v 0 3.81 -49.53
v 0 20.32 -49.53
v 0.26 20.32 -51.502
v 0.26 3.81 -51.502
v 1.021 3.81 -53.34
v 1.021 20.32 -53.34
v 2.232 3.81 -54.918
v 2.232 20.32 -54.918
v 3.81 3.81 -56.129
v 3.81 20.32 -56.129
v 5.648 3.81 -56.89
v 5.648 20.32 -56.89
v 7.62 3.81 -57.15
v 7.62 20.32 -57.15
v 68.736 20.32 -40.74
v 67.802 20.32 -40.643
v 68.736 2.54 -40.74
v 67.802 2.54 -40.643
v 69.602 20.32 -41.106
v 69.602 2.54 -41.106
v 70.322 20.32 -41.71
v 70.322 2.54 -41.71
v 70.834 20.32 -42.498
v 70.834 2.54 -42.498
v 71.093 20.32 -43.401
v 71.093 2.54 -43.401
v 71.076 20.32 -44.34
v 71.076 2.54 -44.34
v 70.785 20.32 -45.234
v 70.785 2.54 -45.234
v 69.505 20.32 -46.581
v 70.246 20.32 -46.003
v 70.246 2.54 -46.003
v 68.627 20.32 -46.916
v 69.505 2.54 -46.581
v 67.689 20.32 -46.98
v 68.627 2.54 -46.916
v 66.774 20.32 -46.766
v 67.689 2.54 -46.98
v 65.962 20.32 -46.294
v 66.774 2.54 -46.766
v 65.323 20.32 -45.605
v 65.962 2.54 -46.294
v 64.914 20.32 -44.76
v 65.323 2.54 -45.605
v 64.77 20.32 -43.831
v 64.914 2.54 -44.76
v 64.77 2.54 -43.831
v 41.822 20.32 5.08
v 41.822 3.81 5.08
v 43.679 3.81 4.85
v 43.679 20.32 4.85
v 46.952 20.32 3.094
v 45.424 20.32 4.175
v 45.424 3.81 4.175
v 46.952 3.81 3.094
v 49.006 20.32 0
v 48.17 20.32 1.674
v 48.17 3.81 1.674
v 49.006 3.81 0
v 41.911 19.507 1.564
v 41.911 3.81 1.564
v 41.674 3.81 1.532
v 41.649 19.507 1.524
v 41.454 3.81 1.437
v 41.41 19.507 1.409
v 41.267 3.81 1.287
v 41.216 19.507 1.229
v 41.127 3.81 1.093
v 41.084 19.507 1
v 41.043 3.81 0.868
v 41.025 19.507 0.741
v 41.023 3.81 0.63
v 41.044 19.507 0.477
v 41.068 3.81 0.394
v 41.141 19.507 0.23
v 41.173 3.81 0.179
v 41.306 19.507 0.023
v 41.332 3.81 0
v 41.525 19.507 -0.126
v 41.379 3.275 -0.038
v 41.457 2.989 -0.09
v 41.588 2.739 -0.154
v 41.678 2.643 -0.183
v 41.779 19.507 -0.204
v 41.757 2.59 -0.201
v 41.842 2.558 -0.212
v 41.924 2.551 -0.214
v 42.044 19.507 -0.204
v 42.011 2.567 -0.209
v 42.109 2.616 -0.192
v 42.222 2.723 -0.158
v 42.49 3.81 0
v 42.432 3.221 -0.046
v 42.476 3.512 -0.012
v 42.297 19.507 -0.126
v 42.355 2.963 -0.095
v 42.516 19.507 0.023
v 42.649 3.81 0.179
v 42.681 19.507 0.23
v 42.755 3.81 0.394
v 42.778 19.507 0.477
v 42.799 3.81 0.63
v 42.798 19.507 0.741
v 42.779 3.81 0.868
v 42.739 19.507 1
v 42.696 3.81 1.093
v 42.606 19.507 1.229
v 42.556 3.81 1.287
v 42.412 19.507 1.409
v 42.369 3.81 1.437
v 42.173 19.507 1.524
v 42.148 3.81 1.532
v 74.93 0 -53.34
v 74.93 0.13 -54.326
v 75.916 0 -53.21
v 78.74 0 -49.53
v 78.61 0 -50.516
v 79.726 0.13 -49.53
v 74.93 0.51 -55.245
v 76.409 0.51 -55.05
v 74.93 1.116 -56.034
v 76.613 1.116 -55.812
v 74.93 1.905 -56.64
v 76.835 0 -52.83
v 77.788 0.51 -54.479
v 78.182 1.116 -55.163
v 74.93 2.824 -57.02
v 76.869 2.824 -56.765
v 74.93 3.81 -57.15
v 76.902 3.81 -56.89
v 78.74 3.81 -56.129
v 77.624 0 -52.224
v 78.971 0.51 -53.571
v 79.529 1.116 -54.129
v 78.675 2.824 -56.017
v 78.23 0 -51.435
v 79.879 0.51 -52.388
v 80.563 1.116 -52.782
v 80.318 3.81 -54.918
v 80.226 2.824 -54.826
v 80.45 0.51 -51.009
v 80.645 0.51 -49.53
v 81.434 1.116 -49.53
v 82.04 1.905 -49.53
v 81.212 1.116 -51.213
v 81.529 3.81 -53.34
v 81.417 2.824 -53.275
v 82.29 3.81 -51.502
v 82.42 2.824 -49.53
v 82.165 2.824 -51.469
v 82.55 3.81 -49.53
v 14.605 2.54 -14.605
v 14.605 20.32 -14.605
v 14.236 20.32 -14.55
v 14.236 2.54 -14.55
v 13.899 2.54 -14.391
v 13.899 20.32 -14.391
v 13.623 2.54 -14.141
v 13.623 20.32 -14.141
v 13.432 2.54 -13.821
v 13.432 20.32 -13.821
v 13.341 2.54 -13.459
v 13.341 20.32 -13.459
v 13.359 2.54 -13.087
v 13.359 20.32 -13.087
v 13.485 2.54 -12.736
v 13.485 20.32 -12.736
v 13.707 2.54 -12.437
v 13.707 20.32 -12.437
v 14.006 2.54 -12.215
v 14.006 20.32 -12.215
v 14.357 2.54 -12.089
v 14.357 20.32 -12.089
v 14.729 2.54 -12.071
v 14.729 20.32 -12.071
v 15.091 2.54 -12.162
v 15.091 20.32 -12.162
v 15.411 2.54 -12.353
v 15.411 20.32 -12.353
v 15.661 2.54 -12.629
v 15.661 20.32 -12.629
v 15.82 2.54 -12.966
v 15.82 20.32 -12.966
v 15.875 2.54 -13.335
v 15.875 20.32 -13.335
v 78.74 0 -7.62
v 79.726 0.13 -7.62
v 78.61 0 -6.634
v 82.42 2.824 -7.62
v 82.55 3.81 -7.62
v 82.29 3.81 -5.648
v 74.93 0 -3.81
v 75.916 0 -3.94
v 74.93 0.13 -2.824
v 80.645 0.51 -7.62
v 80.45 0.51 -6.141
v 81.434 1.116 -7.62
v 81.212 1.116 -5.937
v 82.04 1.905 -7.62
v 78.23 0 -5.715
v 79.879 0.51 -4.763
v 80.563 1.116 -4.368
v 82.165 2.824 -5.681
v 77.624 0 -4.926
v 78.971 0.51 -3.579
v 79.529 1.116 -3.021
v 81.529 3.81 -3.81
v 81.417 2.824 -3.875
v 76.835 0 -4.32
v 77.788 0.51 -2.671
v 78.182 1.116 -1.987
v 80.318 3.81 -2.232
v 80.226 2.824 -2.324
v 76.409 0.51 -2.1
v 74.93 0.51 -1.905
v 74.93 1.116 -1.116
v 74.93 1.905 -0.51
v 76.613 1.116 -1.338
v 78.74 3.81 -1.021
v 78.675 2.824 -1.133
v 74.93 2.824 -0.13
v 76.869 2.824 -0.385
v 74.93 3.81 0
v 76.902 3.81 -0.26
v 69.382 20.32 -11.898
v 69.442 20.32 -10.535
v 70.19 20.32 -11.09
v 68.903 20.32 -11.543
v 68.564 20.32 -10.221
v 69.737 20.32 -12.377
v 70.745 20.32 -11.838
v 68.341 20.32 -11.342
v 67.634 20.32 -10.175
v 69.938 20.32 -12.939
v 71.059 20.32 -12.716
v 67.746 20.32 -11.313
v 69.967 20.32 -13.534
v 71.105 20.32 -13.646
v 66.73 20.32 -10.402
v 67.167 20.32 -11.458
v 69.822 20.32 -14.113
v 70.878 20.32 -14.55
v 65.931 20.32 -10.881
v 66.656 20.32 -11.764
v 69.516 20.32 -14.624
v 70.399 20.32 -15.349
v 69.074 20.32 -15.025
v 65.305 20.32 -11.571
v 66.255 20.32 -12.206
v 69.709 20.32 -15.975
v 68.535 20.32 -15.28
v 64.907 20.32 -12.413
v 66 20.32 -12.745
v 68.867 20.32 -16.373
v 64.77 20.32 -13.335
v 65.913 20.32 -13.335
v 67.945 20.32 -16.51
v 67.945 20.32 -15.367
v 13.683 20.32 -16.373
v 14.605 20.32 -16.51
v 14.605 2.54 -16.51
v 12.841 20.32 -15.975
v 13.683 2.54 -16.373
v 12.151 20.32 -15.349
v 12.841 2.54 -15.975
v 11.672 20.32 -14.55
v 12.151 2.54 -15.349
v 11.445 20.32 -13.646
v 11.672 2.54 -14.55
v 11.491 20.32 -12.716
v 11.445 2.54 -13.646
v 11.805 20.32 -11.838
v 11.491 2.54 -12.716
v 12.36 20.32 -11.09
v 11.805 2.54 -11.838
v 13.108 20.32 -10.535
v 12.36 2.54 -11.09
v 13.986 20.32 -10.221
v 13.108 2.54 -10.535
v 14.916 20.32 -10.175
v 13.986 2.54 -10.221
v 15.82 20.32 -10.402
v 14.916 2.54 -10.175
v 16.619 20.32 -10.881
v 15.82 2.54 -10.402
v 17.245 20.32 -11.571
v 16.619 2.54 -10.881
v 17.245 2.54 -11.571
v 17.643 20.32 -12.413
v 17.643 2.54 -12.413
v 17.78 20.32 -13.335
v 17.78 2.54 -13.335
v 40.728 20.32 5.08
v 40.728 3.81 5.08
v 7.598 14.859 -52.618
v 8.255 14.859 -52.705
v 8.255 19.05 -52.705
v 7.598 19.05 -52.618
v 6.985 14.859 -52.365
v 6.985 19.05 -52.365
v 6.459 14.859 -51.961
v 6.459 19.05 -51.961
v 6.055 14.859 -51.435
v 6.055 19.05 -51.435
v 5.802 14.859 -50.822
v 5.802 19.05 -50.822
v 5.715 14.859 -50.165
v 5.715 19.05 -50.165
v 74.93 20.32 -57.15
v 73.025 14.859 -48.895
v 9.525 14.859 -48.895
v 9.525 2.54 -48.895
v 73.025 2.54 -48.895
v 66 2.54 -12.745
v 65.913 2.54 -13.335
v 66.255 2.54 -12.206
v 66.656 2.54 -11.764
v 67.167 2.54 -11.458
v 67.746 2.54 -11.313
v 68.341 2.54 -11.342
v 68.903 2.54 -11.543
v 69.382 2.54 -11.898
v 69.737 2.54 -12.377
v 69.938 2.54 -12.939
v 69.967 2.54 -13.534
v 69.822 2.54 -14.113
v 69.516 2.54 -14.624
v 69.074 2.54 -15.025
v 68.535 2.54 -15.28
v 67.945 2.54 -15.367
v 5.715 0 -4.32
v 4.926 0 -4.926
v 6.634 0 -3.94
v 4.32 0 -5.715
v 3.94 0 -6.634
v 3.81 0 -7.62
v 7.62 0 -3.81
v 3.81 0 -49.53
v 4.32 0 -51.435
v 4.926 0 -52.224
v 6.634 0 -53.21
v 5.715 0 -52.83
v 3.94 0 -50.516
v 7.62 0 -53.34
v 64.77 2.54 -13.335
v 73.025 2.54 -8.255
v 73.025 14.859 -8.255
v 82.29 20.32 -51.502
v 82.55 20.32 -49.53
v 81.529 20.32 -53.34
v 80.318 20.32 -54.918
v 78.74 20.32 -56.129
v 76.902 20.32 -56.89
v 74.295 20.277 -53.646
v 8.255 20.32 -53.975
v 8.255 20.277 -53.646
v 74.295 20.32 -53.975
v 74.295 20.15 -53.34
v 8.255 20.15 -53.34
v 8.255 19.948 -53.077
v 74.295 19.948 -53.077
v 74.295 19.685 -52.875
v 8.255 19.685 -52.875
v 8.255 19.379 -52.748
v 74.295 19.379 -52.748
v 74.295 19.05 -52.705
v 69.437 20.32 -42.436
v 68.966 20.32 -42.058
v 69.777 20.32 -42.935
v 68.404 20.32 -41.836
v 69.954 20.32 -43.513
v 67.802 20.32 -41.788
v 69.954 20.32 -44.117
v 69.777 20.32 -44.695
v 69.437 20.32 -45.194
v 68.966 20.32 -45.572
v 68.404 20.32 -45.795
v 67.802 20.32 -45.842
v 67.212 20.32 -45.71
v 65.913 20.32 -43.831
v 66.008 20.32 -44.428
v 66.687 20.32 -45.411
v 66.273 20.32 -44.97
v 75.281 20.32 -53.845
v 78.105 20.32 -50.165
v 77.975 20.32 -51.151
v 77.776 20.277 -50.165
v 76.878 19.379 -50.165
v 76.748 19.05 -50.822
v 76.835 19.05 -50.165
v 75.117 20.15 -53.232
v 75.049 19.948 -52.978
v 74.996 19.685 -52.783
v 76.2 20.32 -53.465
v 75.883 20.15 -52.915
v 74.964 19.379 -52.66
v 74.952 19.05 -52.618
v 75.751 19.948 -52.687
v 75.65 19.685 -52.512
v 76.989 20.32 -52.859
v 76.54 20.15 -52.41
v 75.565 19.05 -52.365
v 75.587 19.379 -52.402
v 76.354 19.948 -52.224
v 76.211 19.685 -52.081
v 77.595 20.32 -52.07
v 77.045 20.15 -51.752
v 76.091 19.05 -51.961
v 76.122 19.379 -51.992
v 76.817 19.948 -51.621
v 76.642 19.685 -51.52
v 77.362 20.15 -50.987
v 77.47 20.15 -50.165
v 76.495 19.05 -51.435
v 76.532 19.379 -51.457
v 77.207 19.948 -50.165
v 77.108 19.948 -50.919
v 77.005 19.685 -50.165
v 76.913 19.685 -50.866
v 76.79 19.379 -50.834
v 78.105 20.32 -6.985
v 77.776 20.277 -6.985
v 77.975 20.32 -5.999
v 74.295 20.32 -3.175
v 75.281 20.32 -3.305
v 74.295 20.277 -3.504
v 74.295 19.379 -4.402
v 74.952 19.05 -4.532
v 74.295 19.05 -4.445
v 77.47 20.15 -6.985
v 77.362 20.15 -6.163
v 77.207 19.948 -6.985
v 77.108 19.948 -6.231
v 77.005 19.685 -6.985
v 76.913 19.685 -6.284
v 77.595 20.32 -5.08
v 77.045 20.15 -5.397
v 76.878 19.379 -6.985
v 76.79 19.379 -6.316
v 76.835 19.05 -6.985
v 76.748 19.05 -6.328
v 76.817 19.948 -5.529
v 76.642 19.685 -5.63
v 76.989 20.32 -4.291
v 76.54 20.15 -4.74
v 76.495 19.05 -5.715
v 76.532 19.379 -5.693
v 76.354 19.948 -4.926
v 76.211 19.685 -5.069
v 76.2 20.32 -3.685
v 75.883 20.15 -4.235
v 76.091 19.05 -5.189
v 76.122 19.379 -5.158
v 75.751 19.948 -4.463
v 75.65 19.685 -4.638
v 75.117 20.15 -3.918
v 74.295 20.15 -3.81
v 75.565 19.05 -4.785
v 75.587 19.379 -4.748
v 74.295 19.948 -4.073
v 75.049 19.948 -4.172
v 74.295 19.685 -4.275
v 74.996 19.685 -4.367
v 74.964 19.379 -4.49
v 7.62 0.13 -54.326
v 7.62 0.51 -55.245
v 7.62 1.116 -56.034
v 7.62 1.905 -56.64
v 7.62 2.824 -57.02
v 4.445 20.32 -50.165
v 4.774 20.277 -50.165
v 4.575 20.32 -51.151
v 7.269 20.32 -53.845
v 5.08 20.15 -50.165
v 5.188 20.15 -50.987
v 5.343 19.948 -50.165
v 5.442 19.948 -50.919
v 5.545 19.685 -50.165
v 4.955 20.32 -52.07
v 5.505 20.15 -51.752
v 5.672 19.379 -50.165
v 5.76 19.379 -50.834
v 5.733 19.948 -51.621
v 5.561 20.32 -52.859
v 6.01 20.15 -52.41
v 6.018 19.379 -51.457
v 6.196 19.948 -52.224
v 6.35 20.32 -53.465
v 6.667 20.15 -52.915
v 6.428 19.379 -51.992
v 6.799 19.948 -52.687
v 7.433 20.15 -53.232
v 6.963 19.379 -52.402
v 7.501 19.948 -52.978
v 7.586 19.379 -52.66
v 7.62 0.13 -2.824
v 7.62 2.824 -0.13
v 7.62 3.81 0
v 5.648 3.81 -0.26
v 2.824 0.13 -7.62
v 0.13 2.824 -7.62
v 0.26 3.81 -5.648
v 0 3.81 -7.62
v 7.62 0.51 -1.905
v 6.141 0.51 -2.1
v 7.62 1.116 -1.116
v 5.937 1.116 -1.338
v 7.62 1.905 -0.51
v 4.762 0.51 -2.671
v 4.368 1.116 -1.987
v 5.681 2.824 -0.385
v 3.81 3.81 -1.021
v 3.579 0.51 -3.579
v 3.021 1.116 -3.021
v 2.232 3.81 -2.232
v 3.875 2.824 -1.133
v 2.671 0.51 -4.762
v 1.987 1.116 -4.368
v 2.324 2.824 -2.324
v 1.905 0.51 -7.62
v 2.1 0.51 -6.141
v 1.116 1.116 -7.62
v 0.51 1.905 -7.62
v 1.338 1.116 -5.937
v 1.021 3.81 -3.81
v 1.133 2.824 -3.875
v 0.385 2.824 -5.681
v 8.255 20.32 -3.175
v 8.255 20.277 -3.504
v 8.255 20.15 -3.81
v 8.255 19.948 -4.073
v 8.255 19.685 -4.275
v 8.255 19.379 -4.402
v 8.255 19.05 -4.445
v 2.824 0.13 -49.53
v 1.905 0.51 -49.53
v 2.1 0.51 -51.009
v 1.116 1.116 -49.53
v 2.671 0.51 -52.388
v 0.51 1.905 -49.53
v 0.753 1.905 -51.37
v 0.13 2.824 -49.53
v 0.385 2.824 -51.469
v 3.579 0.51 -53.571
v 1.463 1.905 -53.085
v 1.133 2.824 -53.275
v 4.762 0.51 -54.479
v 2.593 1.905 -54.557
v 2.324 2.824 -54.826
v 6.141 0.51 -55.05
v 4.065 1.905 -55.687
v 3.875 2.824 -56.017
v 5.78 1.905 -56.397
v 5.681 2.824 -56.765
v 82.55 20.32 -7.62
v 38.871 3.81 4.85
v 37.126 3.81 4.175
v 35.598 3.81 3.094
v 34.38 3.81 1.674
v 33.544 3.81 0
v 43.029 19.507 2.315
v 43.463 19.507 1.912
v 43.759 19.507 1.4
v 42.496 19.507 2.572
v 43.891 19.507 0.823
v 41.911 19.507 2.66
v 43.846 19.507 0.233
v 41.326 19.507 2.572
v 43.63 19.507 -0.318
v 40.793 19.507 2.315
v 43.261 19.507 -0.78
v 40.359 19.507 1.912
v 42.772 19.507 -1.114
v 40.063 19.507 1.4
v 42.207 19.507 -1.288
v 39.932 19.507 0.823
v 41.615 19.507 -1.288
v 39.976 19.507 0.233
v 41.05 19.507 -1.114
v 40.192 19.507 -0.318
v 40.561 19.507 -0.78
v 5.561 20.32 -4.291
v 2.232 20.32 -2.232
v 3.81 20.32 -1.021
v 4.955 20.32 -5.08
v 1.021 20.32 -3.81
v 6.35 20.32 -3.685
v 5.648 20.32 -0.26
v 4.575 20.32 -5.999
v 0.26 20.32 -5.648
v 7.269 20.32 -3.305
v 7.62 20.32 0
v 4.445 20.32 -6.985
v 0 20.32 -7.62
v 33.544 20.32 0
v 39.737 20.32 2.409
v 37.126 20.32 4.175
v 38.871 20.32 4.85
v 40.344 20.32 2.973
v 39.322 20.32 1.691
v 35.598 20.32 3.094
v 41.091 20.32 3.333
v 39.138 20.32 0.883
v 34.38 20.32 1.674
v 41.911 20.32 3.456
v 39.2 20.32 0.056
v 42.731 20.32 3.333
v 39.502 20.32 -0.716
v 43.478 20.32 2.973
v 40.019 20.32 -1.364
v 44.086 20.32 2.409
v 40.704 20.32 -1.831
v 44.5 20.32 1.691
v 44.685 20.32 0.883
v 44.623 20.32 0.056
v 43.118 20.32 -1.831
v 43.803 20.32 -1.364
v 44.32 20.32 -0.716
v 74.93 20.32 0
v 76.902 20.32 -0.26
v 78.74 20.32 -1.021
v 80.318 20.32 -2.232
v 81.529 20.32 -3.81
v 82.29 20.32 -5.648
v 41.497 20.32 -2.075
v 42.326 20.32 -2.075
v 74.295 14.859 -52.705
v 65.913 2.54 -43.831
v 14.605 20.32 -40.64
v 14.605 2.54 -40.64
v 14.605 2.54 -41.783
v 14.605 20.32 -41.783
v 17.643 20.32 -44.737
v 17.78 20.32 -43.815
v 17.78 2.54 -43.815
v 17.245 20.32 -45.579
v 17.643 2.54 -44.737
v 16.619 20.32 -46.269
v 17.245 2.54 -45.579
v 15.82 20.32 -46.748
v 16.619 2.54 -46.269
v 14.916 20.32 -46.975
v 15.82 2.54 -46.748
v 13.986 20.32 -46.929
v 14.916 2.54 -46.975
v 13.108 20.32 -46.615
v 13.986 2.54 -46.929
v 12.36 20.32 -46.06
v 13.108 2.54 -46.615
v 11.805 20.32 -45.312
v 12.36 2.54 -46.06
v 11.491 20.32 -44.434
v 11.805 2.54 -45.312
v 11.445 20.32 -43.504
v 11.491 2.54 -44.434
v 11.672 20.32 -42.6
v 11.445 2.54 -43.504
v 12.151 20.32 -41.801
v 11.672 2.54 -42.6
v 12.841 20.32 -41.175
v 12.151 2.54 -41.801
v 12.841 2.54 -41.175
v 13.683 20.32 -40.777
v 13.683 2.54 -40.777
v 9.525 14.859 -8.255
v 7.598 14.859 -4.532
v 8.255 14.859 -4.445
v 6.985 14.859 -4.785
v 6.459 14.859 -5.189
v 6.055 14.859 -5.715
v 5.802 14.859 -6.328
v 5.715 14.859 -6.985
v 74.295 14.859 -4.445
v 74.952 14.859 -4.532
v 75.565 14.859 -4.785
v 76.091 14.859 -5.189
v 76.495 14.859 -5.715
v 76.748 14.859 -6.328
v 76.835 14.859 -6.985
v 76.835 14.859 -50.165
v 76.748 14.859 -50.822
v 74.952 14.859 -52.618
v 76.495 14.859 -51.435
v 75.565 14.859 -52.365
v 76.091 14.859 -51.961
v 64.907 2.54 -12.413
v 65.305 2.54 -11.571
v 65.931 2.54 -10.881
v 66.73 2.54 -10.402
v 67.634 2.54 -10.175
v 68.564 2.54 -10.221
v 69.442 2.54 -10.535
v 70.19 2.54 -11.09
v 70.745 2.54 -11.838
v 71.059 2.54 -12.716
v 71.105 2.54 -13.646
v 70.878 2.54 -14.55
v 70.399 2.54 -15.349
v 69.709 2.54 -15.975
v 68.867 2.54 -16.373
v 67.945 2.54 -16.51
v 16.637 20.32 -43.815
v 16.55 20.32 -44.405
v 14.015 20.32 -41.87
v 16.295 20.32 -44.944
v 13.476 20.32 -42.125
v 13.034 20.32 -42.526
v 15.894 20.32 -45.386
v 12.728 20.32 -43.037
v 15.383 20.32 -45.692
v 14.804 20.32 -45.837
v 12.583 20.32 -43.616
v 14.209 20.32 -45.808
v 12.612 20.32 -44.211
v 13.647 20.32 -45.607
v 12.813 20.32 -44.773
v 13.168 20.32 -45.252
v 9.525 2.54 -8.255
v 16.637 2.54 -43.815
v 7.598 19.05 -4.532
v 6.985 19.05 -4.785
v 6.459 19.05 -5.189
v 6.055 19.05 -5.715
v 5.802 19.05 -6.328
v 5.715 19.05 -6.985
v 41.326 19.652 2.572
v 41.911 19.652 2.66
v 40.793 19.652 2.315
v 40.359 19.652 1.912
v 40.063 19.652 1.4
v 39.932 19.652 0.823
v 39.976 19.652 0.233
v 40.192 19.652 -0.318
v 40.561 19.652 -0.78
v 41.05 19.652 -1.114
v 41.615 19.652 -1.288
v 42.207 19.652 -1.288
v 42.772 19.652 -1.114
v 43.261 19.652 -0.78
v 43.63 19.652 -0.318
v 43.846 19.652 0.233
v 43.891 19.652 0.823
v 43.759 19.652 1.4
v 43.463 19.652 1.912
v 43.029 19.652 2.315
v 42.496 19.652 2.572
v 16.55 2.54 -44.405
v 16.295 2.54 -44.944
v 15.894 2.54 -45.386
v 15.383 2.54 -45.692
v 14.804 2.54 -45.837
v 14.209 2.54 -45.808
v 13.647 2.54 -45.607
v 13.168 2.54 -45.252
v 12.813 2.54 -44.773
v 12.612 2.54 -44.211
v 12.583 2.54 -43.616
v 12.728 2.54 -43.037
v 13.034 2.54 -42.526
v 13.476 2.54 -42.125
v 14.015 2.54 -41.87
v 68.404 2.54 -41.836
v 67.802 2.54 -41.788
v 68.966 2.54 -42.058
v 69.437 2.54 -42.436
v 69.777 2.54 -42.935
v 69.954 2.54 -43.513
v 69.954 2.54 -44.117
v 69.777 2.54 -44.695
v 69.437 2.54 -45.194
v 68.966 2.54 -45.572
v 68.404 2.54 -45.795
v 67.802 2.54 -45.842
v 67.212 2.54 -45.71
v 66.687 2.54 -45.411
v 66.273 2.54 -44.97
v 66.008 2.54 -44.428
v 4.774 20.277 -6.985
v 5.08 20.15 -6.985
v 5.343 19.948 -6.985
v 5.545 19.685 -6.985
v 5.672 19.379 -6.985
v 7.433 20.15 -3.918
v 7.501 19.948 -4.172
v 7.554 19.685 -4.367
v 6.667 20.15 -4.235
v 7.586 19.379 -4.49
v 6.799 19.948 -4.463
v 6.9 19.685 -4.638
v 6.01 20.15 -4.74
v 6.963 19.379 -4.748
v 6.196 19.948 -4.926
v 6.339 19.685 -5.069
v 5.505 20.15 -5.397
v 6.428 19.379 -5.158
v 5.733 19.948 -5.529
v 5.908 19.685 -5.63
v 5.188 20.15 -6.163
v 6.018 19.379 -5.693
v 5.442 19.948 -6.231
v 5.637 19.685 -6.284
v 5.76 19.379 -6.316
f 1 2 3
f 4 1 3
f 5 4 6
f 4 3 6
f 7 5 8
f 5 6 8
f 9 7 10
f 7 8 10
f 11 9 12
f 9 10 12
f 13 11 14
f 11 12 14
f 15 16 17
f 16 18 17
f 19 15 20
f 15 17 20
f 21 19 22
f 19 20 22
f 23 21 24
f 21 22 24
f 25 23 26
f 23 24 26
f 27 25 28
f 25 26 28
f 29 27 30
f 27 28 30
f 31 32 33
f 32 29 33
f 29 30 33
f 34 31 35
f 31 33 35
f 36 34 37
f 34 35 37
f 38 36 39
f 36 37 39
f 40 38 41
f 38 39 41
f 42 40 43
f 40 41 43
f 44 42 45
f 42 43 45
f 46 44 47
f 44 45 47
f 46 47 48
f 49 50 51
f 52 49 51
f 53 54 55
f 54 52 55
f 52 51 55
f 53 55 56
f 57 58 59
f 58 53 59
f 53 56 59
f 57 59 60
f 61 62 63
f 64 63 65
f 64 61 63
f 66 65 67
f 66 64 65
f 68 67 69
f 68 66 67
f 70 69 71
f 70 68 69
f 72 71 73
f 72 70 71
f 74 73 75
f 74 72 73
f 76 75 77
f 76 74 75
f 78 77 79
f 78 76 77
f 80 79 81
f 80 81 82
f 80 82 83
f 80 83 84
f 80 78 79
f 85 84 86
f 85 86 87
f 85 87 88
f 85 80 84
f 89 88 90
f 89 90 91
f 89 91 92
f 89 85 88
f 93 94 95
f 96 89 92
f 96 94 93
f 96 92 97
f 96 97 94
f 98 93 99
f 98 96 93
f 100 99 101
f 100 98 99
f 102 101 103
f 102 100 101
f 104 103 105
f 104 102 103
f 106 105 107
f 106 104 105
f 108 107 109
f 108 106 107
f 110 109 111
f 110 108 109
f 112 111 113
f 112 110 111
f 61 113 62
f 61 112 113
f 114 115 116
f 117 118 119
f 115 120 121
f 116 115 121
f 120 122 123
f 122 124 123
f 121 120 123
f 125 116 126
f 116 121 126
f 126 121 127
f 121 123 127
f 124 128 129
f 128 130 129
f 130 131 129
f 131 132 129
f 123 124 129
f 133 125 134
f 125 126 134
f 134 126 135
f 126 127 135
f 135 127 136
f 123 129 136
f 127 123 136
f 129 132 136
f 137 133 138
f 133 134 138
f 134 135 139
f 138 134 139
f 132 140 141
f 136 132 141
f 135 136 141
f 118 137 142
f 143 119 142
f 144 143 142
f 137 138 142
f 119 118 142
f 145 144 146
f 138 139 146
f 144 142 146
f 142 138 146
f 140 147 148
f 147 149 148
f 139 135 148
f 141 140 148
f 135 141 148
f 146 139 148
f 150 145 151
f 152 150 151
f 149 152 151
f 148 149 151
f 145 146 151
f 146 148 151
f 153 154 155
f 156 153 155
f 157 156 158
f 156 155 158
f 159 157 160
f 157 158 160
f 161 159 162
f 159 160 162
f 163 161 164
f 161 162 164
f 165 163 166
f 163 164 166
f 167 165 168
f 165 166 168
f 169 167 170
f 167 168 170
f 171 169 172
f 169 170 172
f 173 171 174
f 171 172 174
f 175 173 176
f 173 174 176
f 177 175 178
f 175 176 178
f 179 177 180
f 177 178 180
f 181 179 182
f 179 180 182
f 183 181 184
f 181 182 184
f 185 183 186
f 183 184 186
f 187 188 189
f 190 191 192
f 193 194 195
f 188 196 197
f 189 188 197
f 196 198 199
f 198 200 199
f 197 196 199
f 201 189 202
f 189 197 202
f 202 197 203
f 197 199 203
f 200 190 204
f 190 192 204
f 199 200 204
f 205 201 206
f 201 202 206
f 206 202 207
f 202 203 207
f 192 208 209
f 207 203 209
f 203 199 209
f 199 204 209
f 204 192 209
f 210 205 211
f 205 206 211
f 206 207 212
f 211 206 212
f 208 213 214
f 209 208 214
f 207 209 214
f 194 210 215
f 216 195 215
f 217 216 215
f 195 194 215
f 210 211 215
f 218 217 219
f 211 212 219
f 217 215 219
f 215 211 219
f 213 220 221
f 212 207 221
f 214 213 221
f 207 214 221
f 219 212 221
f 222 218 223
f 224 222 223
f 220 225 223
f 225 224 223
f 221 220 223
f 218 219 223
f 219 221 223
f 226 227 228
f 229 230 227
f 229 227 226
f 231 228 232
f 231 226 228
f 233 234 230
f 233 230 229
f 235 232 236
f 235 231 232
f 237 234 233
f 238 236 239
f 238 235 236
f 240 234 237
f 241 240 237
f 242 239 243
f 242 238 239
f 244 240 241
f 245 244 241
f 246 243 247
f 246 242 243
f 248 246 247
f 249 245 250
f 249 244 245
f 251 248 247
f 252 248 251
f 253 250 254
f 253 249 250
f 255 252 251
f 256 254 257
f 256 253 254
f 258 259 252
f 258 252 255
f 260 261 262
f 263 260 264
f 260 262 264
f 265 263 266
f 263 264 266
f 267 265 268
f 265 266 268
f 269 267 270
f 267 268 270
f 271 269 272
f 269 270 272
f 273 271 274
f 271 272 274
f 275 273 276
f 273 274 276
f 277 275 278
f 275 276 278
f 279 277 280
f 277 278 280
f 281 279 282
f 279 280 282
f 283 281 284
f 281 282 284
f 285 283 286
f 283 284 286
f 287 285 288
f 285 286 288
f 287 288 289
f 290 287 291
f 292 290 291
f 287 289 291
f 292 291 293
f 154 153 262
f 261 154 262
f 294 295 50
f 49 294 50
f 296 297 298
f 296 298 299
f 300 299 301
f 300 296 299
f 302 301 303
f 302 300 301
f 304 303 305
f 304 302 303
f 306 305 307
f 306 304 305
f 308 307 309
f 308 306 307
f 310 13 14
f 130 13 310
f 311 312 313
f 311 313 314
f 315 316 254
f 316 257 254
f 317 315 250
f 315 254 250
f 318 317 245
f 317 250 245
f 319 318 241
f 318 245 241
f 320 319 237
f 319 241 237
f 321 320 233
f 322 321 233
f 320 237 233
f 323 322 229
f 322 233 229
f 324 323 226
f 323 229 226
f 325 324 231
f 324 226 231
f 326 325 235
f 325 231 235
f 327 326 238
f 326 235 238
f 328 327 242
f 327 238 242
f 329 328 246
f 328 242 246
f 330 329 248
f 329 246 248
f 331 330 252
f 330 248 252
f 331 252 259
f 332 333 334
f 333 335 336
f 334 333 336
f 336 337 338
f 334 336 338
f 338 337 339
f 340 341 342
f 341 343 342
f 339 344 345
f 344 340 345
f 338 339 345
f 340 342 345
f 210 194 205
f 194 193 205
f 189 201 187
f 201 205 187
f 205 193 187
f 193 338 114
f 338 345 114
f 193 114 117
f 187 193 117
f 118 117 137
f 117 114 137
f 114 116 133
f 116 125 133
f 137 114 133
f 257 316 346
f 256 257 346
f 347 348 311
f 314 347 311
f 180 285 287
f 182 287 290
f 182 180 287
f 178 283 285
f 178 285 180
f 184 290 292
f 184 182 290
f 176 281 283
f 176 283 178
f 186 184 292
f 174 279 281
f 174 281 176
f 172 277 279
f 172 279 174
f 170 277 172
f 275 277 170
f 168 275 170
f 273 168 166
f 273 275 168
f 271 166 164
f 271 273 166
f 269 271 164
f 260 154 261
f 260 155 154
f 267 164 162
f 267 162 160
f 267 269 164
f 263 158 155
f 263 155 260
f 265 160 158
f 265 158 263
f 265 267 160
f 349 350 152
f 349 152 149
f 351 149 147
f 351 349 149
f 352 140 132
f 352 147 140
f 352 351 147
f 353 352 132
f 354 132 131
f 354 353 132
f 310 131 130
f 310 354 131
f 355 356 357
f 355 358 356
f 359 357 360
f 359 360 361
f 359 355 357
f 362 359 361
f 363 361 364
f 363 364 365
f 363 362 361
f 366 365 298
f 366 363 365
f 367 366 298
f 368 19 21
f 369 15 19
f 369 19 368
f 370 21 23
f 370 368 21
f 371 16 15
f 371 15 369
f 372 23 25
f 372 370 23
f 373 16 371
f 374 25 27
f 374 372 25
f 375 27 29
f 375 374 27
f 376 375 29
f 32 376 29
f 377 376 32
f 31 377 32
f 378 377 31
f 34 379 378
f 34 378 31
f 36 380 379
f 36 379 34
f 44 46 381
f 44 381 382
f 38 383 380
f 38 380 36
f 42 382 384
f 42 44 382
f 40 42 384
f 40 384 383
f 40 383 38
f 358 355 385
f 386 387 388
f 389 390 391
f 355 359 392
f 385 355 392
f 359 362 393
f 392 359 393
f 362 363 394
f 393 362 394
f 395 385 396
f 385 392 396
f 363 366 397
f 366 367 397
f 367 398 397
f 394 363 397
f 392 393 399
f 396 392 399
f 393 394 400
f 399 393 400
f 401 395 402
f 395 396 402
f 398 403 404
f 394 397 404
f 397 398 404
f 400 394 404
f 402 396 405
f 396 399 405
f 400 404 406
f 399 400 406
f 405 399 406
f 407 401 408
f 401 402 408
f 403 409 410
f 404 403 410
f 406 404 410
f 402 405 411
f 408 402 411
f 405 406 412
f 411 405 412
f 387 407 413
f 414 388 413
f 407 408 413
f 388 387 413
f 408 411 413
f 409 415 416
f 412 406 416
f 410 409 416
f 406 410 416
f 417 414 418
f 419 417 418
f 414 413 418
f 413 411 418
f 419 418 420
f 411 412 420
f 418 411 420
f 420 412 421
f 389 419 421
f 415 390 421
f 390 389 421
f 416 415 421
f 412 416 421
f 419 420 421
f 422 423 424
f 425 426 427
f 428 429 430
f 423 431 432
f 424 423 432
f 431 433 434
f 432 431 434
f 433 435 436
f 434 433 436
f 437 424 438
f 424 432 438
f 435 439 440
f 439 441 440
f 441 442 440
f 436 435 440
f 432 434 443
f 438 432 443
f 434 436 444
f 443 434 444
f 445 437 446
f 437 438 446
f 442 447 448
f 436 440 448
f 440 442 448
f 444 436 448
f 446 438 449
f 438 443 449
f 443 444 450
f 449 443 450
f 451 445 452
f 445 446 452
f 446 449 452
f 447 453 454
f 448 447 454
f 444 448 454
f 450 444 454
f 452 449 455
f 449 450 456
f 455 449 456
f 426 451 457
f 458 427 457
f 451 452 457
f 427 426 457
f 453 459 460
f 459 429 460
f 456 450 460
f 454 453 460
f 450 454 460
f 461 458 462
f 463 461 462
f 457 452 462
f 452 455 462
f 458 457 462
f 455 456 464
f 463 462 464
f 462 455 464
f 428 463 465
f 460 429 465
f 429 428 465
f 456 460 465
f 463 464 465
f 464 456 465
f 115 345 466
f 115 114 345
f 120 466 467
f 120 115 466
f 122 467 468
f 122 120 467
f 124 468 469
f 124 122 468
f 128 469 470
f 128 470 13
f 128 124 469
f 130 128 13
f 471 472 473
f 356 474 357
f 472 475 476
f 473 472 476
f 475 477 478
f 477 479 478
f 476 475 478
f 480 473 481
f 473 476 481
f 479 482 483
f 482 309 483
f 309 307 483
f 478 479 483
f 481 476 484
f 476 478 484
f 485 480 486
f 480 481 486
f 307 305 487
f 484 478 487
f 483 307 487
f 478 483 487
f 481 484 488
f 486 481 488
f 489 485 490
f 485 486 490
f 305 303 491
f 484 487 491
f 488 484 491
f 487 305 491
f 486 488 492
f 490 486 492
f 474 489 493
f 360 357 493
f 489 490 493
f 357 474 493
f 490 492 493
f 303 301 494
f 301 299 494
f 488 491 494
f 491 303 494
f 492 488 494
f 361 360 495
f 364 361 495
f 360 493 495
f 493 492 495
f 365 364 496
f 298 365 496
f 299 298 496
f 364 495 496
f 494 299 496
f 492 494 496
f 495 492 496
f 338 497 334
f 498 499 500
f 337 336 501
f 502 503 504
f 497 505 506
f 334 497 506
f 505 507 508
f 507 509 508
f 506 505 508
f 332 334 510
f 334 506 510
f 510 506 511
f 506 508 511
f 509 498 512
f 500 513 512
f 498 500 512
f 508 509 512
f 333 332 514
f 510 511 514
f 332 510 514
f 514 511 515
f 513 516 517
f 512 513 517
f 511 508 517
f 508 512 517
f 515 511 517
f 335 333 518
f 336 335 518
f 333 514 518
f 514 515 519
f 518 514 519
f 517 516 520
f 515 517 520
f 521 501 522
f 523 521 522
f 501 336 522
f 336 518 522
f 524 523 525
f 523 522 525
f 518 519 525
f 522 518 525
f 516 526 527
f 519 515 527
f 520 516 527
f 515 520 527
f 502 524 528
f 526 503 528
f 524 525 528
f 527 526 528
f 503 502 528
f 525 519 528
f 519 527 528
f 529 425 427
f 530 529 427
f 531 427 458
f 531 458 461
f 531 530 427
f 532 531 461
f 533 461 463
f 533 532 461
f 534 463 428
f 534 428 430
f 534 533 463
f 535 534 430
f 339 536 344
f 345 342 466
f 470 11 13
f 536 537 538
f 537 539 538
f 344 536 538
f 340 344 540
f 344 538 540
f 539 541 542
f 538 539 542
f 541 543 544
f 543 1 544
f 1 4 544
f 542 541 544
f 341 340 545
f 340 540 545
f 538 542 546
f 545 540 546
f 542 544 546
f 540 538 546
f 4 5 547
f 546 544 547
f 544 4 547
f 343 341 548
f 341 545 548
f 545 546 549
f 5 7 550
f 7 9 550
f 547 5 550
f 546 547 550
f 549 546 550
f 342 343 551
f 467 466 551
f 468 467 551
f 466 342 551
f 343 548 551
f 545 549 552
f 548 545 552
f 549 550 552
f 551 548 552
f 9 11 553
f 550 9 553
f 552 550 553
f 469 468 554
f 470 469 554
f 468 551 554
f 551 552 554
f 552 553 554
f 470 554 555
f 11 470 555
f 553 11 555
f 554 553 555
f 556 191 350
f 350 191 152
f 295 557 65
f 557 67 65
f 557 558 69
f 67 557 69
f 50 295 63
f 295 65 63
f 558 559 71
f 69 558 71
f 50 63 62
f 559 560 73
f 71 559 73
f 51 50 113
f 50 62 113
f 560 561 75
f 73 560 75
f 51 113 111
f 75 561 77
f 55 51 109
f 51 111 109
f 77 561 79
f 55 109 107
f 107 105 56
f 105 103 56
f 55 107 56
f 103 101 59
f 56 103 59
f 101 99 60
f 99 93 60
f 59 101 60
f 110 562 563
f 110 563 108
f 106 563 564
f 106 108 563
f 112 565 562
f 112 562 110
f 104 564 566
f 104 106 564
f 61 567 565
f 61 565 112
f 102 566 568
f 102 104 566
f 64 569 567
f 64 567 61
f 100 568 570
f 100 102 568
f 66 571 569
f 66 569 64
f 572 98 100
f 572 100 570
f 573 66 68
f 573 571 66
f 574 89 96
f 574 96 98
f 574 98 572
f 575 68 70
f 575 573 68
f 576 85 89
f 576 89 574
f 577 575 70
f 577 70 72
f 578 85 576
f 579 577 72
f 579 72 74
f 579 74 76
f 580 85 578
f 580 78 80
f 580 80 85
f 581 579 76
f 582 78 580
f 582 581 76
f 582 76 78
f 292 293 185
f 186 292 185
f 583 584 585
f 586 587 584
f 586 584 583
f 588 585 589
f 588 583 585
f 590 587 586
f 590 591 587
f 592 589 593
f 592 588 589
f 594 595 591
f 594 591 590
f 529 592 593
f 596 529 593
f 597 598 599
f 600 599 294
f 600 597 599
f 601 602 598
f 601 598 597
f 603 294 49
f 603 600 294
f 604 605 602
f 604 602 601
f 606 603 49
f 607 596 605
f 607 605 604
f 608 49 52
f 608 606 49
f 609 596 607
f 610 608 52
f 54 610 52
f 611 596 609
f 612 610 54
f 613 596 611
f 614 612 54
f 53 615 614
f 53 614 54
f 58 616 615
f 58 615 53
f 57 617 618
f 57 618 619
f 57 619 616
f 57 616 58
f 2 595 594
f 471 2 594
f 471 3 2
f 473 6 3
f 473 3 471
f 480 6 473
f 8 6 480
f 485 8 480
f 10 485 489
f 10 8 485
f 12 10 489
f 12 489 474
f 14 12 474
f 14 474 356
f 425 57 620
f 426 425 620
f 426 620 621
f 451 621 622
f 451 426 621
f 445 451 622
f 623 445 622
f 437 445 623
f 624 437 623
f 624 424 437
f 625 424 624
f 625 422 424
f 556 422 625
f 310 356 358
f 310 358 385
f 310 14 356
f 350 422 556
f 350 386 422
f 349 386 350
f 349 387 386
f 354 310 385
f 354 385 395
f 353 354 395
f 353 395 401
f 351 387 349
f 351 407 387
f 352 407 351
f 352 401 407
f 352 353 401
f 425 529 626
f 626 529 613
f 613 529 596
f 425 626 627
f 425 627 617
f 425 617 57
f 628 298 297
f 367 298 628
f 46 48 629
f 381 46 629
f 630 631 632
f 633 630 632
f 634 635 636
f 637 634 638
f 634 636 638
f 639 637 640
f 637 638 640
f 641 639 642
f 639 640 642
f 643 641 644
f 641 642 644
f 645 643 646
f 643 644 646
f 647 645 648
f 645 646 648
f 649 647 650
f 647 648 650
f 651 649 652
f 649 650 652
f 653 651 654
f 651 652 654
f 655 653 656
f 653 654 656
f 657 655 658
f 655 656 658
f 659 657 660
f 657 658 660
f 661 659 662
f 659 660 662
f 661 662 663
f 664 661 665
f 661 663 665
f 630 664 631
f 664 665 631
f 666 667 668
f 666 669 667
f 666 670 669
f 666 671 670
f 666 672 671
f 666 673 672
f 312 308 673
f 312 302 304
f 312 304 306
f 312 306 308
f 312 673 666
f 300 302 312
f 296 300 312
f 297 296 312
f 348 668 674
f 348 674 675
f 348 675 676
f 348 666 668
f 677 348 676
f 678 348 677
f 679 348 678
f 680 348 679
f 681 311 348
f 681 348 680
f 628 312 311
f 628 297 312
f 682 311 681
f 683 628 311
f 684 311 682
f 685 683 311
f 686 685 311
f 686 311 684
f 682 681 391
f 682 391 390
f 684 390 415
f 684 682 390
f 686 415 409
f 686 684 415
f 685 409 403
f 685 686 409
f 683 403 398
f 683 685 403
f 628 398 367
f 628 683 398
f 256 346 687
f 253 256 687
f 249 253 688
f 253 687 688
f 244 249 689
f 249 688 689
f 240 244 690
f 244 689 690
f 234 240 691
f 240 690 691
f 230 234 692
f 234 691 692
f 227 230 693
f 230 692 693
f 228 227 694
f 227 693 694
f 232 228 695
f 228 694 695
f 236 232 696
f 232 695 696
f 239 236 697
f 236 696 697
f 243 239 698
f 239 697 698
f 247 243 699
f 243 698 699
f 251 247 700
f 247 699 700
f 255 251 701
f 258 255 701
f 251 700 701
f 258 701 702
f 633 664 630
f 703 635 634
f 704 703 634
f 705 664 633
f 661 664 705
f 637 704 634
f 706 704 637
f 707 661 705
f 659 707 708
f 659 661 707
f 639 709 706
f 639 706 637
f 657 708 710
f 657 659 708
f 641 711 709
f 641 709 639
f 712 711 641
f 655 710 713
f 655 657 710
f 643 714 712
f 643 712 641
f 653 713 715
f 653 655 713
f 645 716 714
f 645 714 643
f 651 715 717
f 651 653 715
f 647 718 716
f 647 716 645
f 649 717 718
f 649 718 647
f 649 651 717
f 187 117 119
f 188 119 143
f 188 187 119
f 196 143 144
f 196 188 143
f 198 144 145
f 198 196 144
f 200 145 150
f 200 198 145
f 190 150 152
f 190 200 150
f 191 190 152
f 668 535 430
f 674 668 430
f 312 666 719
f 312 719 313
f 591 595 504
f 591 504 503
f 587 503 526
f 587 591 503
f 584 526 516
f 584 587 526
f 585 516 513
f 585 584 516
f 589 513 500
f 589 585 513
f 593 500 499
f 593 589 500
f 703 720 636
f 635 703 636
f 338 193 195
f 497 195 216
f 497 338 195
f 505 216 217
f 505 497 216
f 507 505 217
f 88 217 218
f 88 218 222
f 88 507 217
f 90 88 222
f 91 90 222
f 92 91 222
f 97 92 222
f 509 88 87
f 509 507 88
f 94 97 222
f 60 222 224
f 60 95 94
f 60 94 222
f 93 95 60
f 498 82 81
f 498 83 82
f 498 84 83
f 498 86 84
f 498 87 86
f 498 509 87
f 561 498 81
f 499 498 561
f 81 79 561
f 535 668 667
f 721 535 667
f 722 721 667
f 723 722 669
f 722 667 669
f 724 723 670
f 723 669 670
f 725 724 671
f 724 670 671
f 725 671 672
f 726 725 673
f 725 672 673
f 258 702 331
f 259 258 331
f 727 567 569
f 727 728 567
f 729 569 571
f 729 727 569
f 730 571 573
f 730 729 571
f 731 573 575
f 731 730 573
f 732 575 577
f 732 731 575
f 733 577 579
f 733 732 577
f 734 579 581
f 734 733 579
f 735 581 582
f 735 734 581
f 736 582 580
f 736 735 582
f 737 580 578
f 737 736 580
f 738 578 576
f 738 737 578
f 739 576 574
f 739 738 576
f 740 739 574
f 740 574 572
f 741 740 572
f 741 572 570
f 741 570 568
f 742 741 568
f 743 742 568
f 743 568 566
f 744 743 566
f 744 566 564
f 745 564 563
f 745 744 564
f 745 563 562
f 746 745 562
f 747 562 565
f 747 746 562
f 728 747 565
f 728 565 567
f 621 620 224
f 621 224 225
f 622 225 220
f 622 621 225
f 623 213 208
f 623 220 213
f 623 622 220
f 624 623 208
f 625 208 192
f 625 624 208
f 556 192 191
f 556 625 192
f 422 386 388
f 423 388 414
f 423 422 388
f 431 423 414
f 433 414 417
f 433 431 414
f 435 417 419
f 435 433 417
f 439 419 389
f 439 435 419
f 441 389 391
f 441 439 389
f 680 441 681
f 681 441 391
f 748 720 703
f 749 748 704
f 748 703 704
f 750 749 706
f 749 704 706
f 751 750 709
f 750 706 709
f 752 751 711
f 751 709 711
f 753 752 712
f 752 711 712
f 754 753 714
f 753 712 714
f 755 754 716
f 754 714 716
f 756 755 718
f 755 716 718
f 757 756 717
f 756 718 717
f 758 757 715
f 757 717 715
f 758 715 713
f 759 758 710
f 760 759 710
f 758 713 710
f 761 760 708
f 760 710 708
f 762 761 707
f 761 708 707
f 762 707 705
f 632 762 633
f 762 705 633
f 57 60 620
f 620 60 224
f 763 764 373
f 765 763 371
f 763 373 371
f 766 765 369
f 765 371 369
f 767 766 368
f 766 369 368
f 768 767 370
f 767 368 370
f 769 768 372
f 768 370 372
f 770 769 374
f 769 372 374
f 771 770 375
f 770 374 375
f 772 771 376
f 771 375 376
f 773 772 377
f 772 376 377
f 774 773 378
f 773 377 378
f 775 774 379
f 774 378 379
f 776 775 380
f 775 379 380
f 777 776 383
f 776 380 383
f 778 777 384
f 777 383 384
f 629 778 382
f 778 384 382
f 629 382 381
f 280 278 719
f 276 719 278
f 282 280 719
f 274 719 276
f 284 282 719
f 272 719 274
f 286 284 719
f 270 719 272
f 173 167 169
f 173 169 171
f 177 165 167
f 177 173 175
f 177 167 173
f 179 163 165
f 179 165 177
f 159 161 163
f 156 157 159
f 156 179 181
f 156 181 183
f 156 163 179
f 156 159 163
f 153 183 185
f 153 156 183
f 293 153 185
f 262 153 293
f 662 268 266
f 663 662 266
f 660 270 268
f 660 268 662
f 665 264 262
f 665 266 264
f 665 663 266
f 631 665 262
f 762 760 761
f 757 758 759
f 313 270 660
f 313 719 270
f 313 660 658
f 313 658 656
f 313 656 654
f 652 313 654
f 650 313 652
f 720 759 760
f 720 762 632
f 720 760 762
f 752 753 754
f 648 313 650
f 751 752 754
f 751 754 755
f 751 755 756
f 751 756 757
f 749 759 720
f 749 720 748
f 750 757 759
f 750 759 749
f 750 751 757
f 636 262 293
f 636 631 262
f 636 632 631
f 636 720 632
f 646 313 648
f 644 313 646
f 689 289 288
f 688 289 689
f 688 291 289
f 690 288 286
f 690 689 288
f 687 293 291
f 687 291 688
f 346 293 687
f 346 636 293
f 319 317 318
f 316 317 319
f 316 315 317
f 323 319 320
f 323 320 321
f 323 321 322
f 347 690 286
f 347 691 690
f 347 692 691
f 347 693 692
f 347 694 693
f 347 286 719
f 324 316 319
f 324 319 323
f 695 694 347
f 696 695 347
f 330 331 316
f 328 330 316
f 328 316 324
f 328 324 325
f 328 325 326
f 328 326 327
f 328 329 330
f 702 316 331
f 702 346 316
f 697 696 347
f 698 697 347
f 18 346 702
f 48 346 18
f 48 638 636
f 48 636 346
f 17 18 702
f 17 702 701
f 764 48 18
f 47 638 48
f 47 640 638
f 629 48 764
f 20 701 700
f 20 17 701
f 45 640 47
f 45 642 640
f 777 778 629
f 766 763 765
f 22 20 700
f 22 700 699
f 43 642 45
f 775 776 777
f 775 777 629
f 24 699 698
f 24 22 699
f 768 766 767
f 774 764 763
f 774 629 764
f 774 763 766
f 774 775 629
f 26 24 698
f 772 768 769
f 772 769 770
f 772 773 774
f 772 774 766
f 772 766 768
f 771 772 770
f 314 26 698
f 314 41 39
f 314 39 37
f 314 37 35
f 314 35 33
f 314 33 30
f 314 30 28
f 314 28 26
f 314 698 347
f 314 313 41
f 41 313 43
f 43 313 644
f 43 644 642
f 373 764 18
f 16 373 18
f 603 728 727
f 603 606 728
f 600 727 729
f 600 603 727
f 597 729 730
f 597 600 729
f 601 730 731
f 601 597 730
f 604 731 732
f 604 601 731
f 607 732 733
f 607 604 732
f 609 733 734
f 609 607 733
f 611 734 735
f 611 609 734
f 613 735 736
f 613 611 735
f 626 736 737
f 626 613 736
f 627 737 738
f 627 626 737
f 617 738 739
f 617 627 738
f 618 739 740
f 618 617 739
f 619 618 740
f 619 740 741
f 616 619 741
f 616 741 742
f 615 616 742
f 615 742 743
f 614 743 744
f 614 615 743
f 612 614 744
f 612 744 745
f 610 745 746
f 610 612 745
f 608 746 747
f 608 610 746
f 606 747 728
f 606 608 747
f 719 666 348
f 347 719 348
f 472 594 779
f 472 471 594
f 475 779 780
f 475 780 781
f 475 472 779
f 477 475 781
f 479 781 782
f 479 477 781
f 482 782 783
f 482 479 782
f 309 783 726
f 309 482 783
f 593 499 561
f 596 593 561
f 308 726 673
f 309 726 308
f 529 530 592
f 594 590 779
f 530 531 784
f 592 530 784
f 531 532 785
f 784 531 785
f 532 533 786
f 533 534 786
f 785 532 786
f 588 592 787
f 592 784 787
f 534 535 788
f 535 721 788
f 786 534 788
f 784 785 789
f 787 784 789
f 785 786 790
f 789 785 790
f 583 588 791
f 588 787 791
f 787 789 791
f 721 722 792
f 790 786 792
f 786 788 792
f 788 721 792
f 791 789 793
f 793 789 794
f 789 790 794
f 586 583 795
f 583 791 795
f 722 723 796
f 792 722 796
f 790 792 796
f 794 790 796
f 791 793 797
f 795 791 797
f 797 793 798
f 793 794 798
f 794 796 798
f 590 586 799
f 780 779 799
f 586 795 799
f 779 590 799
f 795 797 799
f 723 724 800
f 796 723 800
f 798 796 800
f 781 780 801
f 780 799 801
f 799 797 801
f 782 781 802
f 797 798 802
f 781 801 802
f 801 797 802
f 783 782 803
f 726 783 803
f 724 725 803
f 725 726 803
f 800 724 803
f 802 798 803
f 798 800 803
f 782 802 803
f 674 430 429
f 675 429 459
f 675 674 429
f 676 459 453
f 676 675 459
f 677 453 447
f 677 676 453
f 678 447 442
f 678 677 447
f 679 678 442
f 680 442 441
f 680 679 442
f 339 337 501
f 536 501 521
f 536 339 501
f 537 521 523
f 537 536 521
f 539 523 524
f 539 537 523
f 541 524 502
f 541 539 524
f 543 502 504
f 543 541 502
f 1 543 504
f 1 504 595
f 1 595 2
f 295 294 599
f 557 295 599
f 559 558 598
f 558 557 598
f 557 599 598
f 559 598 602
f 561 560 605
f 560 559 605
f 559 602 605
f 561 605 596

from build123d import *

# Parameters (mm, degrees)
SKETCH1_W               = 82.55
SKETCH1_H               = 57.15
BOSS_EXTRUDE1_DEPTH     = 20.32
FILLET2_R               = 7.62
FILLET3_R               = 3.81
SKETCH2_W               = 63.5
SKETCH2_H               = 40.64
CUT_EXTRUDE1_DEPTH      = 17.78
SKETCH9_W               = 15.46152766
SKETCH9_H               = 16.51
BOSS_EXTRUDE5_DEPTH     = 5.08
FILLET10_R              = 7.62
SKETCH7_W               = 71.12
SKETCH7_H               = 48.26
CUT_EXTRUDE4_DEPTH      = 5.461
FILLET12_R              = 2.54
FILLET13_R              = 1.27
SKETCH5_R               = 3.175
BOSS_EXTRUDE6_DEPTH     = 17.78
SKETCH11_R              = 1.27
SKETCH11_R_2            = 2.032
CUT_EXTRUDE5_DEPTH      = 17.78
CUT_EXTRUDE_THIN1_DEPTH = 102.964471319


with BuildPart() as part:
    # Sketch1 → Boss-Extrude1 (new body)
    with BuildSketch(Plane(origin=(0, 0, 0), x_dir=(1, 0, 0), z_dir=(0, 1, 0))):
        with Locations((41.275, 28.575)):
            Rectangle(SKETCH1_W, SKETCH1_H)
    extrude(amount=BOSS_EXTRUDE1_DEPTH)

    # Fillet2
    fillet2_edges = [part.edges().sort_by_distance(p)[0] for p in [
        (0, 10.16, -57.15),
        (82.55, 10.16, -57.15),
        (82.55, 10.16, 0),
        (0, 10.16, 0),
    ]]
    fillet(fillet2_edges, radius=FILLET2_R)

    # Fillet3
    fillet3_edges = [part.edges().sort_by_distance(p)[0] for p in [
        (41.275, 0, -57.15),
        (0, 0, -28.575),
        (82.55, 0, -28.575),
        (41.275, 0, 0),
        (2.231846327, 0, -54.918153673),
        (2.231846327, 0, -2.231846327),
        (80.318153673, 0, -2.231846327),
        (80.318153673, 0, -54.918153673),
    ]]
    fillet(fillet3_edges, radius=FILLET3_R)

    # Sketch2 → Cut-Extrude1 (cut)
    with BuildSketch(Plane(origin=(0, 20.32, 0), x_dir=(1, 0, 0), z_dir=(0, 1, 0))):
        with Locations((41.275, 28.575)):
            Rectangle(SKETCH2_W, SKETCH2_H)
    extrude(amount=-CUT_EXTRUDE1_DEPTH, mode=Mode.SUBTRACT)

    # Sketch9 → Boss-Extrude5 (add)
    with BuildSketch(Plane.XY):
        with Locations((41.275, 12.065)):
            Rectangle(SKETCH9_W, SKETCH9_H)
    extrude(amount=BOSS_EXTRUDE5_DEPTH)

    # Fillet10
    # the kernel refuses this fillet: 7.62 mm, written as the material it takes off along each edge
    with BuildSketch(Plane(origin=(49.00576383, -14.150512242, 5.08), x_dir=(-1, 0, 0), z_dir=(0, 1, 0))) as fillet10_piece_1:
        with BuildLine():
            CenterArc((7.184204897, -7.62), FILLET10_R, 90, 70.528779366)
            Line((0, -5.08), (-0.143684098, -5.0292))
            ThreePointArc((-0.143684098, -5.0292), (-0.1524, -2.54), (-0.1524, 0))
            Line((-0.1524, 0), (0, 0.1524))
            Line((0, 0.1524), (7.184204897, 0.1524))
            Line((7.184204897, 0.1524), (7.184204897, 0))
        make_face()
    extrude(amount=52.431024484, mode=Mode.SUBTRACT)
    with BuildSketch(Plane(origin=(33.54423617, 38.280512242, 5.08), x_dir=(0, 0, -1), z_dir=(0, -1, 0))) as fillet10_piece_2:
        with BuildLine():
            CenterArc((7.62, 7.184204897), FILLET10_R, 180, 70.528779366)
            Line((0, 7.184204897), (-0.1524, 7.184204897))
            Line((-0.1524, 7.184204897), (-0.1524, 0))
            Line((-0.1524, 0), (0, -0.1524))
            ThreePointArc((0, -0.1524), (2.54, -0.1524), (5.0292, -0.143684098))
            Line((5.0292, -0.143684098), (5.08, 0))
        make_face()
    extrude(amount=52.431024484, mode=Mode.SUBTRACT)

    # Sketch7 → Cut-Extrude4 (cut)
    with BuildSketch(Plane(origin=(0, 20.32, 0), x_dir=(1, 0, 0), z_dir=(0, 1, 0))):
        with Locations((41.275, 28.575)):
            Rectangle(SKETCH7_W, SKETCH7_H)
    extrude(amount=-CUT_EXTRUDE4_DEPTH, mode=Mode.SUBTRACT)

    # Fillet12
    fillet12_edges = [part.edges().sort_by_distance(p)[0] for p in [
        (5.715, 17.5895, -52.705),
        (76.835, 17.5895, -52.705),
        (76.835, 17.5895, -4.445),
        (5.715, 17.5895, -4.445),
    ]]
    fillet(fillet12_edges, radius=FILLET12_R)

    # Fillet13
    fillet13_edges = [part.edges().sort_by_distance(p)[0] for p in [
        (41.275, 20.32, -52.705),
        (76.835, 20.32, -28.575),
        (41.275, 20.32, -4.445),
        (5.715, 20.32, -28.575),
        (76.091051224, 20.32, -51.961051224),
        (76.091051224, 20.32, -5.188948776),
        (6.458948776, 20.32, -51.961051224),
        (6.458948776, 20.32, -5.188948776),
    ]]
    fillet(fillet13_edges, radius=FILLET13_R)

    # Sketch5 → Boss-Extrude6 (add)
    with BuildSketch(Plane(origin=(0, 2.54, 0), x_dir=(1, 0, 0), z_dir=(0, 1, 0))):
        with Locations(Location((14.605, 43.815, 0), (0, 0, 90))):
            Circle(SKETCH5_R)
        with Locations(Location((14.605, 13.335, 0), (0, 0, 90))):
            Circle(SKETCH5_R)
        with Locations(Location((67.945, 43.815, 0), (0, 0, 90))):
            Circle(SKETCH5_R)
        with Locations(Location((67.945, 13.335, 0), (0, 0, 90))):
            Circle(SKETCH5_R)
    extrude(amount=BOSS_EXTRUDE6_DEPTH)

    # Sketch11 → Cut-Extrude5 (cut)
    with BuildSketch(Plane(origin=(0, 20.32, 0), x_dir=(1, 0, 0), z_dir=(0, 1, 0))):
        with Locations(Location((14.605, 13.335, 0), (0, 0, 270))):
            Circle(SKETCH11_R)
        with Locations(Location((14.605, 43.815, 0), (0, 0, 270))):
            Circle(SKETCH11_R_2)
        with Locations(Location((67.945, 13.335, 0), (0, 0, 270))):
            Circle(SKETCH11_R_2)
        with Locations(Location((67.945, 43.815, 0), (0, 0, 270))):
            Circle(SKETCH11_R_2)
    extrude(amount=-CUT_EXTRUDE5_DEPTH, mode=Mode.SUBTRACT)

    # Sketch17 → Cut-Extrude-Thin1 (cut, through all)
    with BuildSketch(Plane(origin=(0, 2.54, 0), x_dir=(1, 0, 0), z_dir=(0, 1, 0))):
        with BuildLine():
            ThreePointArc((67.801605081, 40.643239779), (65.547471879, 41.576932323), (64.613779335, 43.831065525))
            Line((64.613779335, 43.831065525), (67.153779335, 43.831065525))
            ThreePointArc((67.153779335, 43.831065525), (67.343523103, 43.372983547), (67.801605081, 43.183239779))
            Line((67.801605081, 43.183239779), (67.801605081, 40.643239779))
        make_face()
        with BuildLine():
            ThreePointArc((64.77, 13.335), (65.69993597, 15.58006403), (67.945, 16.51))
            Line((67.945, 16.51), (67.945, 13.97))
            ThreePointArc((67.945, 13.97), (67.495987194, 13.784012806), (67.31, 13.335))
            Line((67.31, 13.335), (64.77, 13.335))
        make_face()
        with BuildLine():
            ThreePointArc((17.78, 43.815), (16.85006403, 41.56993597), (14.605, 40.64))
            Line((14.605, 40.64), (14.605, 43.18))
            ThreePointArc((14.605, 43.18), (15.054012806, 43.365987194), (15.24, 43.815))
            Line((15.24, 43.815), (17.78, 43.815))
        make_face()
        with BuildLine():
            ThreePointArc((14.605, 16.51), (16.85006403, 15.58006403), (17.78, 13.335))
            Line((17.78, 13.335), (15.24, 13.335))
            ThreePointArc((15.24, 13.335), (15.054012806, 13.784012806), (14.605, 13.97))
            Line((14.605, 13.97), (14.605, 16.51))
        make_face()
    extrude(amount=CUT_EXTRUDE_THIN1_DEPTH, mode=Mode.SUBTRACT)

    # Sketch19 → CBORE for #0 Binding Head Machine Screw1 (revolve, cut)
    with BuildSketch(Plane(origin=(41.911122971, 20.32, 0.674781491), x_dir=(0, 0, 1), z_dir=(1, 0, 0))):
        Polygon((0, 0), (0, 20.32), (0.889, 20.32), (0.889, 0.8128), (1.98501, 0.8128), (1.98501, 0.668166645), (2.7813, 0), align=None)
    revolve(axis=Axis((41.911122971, 26.67, 0.674781491), (0, -1, 0)), mode=Mode.SUBTRACT)


solid = part.part
